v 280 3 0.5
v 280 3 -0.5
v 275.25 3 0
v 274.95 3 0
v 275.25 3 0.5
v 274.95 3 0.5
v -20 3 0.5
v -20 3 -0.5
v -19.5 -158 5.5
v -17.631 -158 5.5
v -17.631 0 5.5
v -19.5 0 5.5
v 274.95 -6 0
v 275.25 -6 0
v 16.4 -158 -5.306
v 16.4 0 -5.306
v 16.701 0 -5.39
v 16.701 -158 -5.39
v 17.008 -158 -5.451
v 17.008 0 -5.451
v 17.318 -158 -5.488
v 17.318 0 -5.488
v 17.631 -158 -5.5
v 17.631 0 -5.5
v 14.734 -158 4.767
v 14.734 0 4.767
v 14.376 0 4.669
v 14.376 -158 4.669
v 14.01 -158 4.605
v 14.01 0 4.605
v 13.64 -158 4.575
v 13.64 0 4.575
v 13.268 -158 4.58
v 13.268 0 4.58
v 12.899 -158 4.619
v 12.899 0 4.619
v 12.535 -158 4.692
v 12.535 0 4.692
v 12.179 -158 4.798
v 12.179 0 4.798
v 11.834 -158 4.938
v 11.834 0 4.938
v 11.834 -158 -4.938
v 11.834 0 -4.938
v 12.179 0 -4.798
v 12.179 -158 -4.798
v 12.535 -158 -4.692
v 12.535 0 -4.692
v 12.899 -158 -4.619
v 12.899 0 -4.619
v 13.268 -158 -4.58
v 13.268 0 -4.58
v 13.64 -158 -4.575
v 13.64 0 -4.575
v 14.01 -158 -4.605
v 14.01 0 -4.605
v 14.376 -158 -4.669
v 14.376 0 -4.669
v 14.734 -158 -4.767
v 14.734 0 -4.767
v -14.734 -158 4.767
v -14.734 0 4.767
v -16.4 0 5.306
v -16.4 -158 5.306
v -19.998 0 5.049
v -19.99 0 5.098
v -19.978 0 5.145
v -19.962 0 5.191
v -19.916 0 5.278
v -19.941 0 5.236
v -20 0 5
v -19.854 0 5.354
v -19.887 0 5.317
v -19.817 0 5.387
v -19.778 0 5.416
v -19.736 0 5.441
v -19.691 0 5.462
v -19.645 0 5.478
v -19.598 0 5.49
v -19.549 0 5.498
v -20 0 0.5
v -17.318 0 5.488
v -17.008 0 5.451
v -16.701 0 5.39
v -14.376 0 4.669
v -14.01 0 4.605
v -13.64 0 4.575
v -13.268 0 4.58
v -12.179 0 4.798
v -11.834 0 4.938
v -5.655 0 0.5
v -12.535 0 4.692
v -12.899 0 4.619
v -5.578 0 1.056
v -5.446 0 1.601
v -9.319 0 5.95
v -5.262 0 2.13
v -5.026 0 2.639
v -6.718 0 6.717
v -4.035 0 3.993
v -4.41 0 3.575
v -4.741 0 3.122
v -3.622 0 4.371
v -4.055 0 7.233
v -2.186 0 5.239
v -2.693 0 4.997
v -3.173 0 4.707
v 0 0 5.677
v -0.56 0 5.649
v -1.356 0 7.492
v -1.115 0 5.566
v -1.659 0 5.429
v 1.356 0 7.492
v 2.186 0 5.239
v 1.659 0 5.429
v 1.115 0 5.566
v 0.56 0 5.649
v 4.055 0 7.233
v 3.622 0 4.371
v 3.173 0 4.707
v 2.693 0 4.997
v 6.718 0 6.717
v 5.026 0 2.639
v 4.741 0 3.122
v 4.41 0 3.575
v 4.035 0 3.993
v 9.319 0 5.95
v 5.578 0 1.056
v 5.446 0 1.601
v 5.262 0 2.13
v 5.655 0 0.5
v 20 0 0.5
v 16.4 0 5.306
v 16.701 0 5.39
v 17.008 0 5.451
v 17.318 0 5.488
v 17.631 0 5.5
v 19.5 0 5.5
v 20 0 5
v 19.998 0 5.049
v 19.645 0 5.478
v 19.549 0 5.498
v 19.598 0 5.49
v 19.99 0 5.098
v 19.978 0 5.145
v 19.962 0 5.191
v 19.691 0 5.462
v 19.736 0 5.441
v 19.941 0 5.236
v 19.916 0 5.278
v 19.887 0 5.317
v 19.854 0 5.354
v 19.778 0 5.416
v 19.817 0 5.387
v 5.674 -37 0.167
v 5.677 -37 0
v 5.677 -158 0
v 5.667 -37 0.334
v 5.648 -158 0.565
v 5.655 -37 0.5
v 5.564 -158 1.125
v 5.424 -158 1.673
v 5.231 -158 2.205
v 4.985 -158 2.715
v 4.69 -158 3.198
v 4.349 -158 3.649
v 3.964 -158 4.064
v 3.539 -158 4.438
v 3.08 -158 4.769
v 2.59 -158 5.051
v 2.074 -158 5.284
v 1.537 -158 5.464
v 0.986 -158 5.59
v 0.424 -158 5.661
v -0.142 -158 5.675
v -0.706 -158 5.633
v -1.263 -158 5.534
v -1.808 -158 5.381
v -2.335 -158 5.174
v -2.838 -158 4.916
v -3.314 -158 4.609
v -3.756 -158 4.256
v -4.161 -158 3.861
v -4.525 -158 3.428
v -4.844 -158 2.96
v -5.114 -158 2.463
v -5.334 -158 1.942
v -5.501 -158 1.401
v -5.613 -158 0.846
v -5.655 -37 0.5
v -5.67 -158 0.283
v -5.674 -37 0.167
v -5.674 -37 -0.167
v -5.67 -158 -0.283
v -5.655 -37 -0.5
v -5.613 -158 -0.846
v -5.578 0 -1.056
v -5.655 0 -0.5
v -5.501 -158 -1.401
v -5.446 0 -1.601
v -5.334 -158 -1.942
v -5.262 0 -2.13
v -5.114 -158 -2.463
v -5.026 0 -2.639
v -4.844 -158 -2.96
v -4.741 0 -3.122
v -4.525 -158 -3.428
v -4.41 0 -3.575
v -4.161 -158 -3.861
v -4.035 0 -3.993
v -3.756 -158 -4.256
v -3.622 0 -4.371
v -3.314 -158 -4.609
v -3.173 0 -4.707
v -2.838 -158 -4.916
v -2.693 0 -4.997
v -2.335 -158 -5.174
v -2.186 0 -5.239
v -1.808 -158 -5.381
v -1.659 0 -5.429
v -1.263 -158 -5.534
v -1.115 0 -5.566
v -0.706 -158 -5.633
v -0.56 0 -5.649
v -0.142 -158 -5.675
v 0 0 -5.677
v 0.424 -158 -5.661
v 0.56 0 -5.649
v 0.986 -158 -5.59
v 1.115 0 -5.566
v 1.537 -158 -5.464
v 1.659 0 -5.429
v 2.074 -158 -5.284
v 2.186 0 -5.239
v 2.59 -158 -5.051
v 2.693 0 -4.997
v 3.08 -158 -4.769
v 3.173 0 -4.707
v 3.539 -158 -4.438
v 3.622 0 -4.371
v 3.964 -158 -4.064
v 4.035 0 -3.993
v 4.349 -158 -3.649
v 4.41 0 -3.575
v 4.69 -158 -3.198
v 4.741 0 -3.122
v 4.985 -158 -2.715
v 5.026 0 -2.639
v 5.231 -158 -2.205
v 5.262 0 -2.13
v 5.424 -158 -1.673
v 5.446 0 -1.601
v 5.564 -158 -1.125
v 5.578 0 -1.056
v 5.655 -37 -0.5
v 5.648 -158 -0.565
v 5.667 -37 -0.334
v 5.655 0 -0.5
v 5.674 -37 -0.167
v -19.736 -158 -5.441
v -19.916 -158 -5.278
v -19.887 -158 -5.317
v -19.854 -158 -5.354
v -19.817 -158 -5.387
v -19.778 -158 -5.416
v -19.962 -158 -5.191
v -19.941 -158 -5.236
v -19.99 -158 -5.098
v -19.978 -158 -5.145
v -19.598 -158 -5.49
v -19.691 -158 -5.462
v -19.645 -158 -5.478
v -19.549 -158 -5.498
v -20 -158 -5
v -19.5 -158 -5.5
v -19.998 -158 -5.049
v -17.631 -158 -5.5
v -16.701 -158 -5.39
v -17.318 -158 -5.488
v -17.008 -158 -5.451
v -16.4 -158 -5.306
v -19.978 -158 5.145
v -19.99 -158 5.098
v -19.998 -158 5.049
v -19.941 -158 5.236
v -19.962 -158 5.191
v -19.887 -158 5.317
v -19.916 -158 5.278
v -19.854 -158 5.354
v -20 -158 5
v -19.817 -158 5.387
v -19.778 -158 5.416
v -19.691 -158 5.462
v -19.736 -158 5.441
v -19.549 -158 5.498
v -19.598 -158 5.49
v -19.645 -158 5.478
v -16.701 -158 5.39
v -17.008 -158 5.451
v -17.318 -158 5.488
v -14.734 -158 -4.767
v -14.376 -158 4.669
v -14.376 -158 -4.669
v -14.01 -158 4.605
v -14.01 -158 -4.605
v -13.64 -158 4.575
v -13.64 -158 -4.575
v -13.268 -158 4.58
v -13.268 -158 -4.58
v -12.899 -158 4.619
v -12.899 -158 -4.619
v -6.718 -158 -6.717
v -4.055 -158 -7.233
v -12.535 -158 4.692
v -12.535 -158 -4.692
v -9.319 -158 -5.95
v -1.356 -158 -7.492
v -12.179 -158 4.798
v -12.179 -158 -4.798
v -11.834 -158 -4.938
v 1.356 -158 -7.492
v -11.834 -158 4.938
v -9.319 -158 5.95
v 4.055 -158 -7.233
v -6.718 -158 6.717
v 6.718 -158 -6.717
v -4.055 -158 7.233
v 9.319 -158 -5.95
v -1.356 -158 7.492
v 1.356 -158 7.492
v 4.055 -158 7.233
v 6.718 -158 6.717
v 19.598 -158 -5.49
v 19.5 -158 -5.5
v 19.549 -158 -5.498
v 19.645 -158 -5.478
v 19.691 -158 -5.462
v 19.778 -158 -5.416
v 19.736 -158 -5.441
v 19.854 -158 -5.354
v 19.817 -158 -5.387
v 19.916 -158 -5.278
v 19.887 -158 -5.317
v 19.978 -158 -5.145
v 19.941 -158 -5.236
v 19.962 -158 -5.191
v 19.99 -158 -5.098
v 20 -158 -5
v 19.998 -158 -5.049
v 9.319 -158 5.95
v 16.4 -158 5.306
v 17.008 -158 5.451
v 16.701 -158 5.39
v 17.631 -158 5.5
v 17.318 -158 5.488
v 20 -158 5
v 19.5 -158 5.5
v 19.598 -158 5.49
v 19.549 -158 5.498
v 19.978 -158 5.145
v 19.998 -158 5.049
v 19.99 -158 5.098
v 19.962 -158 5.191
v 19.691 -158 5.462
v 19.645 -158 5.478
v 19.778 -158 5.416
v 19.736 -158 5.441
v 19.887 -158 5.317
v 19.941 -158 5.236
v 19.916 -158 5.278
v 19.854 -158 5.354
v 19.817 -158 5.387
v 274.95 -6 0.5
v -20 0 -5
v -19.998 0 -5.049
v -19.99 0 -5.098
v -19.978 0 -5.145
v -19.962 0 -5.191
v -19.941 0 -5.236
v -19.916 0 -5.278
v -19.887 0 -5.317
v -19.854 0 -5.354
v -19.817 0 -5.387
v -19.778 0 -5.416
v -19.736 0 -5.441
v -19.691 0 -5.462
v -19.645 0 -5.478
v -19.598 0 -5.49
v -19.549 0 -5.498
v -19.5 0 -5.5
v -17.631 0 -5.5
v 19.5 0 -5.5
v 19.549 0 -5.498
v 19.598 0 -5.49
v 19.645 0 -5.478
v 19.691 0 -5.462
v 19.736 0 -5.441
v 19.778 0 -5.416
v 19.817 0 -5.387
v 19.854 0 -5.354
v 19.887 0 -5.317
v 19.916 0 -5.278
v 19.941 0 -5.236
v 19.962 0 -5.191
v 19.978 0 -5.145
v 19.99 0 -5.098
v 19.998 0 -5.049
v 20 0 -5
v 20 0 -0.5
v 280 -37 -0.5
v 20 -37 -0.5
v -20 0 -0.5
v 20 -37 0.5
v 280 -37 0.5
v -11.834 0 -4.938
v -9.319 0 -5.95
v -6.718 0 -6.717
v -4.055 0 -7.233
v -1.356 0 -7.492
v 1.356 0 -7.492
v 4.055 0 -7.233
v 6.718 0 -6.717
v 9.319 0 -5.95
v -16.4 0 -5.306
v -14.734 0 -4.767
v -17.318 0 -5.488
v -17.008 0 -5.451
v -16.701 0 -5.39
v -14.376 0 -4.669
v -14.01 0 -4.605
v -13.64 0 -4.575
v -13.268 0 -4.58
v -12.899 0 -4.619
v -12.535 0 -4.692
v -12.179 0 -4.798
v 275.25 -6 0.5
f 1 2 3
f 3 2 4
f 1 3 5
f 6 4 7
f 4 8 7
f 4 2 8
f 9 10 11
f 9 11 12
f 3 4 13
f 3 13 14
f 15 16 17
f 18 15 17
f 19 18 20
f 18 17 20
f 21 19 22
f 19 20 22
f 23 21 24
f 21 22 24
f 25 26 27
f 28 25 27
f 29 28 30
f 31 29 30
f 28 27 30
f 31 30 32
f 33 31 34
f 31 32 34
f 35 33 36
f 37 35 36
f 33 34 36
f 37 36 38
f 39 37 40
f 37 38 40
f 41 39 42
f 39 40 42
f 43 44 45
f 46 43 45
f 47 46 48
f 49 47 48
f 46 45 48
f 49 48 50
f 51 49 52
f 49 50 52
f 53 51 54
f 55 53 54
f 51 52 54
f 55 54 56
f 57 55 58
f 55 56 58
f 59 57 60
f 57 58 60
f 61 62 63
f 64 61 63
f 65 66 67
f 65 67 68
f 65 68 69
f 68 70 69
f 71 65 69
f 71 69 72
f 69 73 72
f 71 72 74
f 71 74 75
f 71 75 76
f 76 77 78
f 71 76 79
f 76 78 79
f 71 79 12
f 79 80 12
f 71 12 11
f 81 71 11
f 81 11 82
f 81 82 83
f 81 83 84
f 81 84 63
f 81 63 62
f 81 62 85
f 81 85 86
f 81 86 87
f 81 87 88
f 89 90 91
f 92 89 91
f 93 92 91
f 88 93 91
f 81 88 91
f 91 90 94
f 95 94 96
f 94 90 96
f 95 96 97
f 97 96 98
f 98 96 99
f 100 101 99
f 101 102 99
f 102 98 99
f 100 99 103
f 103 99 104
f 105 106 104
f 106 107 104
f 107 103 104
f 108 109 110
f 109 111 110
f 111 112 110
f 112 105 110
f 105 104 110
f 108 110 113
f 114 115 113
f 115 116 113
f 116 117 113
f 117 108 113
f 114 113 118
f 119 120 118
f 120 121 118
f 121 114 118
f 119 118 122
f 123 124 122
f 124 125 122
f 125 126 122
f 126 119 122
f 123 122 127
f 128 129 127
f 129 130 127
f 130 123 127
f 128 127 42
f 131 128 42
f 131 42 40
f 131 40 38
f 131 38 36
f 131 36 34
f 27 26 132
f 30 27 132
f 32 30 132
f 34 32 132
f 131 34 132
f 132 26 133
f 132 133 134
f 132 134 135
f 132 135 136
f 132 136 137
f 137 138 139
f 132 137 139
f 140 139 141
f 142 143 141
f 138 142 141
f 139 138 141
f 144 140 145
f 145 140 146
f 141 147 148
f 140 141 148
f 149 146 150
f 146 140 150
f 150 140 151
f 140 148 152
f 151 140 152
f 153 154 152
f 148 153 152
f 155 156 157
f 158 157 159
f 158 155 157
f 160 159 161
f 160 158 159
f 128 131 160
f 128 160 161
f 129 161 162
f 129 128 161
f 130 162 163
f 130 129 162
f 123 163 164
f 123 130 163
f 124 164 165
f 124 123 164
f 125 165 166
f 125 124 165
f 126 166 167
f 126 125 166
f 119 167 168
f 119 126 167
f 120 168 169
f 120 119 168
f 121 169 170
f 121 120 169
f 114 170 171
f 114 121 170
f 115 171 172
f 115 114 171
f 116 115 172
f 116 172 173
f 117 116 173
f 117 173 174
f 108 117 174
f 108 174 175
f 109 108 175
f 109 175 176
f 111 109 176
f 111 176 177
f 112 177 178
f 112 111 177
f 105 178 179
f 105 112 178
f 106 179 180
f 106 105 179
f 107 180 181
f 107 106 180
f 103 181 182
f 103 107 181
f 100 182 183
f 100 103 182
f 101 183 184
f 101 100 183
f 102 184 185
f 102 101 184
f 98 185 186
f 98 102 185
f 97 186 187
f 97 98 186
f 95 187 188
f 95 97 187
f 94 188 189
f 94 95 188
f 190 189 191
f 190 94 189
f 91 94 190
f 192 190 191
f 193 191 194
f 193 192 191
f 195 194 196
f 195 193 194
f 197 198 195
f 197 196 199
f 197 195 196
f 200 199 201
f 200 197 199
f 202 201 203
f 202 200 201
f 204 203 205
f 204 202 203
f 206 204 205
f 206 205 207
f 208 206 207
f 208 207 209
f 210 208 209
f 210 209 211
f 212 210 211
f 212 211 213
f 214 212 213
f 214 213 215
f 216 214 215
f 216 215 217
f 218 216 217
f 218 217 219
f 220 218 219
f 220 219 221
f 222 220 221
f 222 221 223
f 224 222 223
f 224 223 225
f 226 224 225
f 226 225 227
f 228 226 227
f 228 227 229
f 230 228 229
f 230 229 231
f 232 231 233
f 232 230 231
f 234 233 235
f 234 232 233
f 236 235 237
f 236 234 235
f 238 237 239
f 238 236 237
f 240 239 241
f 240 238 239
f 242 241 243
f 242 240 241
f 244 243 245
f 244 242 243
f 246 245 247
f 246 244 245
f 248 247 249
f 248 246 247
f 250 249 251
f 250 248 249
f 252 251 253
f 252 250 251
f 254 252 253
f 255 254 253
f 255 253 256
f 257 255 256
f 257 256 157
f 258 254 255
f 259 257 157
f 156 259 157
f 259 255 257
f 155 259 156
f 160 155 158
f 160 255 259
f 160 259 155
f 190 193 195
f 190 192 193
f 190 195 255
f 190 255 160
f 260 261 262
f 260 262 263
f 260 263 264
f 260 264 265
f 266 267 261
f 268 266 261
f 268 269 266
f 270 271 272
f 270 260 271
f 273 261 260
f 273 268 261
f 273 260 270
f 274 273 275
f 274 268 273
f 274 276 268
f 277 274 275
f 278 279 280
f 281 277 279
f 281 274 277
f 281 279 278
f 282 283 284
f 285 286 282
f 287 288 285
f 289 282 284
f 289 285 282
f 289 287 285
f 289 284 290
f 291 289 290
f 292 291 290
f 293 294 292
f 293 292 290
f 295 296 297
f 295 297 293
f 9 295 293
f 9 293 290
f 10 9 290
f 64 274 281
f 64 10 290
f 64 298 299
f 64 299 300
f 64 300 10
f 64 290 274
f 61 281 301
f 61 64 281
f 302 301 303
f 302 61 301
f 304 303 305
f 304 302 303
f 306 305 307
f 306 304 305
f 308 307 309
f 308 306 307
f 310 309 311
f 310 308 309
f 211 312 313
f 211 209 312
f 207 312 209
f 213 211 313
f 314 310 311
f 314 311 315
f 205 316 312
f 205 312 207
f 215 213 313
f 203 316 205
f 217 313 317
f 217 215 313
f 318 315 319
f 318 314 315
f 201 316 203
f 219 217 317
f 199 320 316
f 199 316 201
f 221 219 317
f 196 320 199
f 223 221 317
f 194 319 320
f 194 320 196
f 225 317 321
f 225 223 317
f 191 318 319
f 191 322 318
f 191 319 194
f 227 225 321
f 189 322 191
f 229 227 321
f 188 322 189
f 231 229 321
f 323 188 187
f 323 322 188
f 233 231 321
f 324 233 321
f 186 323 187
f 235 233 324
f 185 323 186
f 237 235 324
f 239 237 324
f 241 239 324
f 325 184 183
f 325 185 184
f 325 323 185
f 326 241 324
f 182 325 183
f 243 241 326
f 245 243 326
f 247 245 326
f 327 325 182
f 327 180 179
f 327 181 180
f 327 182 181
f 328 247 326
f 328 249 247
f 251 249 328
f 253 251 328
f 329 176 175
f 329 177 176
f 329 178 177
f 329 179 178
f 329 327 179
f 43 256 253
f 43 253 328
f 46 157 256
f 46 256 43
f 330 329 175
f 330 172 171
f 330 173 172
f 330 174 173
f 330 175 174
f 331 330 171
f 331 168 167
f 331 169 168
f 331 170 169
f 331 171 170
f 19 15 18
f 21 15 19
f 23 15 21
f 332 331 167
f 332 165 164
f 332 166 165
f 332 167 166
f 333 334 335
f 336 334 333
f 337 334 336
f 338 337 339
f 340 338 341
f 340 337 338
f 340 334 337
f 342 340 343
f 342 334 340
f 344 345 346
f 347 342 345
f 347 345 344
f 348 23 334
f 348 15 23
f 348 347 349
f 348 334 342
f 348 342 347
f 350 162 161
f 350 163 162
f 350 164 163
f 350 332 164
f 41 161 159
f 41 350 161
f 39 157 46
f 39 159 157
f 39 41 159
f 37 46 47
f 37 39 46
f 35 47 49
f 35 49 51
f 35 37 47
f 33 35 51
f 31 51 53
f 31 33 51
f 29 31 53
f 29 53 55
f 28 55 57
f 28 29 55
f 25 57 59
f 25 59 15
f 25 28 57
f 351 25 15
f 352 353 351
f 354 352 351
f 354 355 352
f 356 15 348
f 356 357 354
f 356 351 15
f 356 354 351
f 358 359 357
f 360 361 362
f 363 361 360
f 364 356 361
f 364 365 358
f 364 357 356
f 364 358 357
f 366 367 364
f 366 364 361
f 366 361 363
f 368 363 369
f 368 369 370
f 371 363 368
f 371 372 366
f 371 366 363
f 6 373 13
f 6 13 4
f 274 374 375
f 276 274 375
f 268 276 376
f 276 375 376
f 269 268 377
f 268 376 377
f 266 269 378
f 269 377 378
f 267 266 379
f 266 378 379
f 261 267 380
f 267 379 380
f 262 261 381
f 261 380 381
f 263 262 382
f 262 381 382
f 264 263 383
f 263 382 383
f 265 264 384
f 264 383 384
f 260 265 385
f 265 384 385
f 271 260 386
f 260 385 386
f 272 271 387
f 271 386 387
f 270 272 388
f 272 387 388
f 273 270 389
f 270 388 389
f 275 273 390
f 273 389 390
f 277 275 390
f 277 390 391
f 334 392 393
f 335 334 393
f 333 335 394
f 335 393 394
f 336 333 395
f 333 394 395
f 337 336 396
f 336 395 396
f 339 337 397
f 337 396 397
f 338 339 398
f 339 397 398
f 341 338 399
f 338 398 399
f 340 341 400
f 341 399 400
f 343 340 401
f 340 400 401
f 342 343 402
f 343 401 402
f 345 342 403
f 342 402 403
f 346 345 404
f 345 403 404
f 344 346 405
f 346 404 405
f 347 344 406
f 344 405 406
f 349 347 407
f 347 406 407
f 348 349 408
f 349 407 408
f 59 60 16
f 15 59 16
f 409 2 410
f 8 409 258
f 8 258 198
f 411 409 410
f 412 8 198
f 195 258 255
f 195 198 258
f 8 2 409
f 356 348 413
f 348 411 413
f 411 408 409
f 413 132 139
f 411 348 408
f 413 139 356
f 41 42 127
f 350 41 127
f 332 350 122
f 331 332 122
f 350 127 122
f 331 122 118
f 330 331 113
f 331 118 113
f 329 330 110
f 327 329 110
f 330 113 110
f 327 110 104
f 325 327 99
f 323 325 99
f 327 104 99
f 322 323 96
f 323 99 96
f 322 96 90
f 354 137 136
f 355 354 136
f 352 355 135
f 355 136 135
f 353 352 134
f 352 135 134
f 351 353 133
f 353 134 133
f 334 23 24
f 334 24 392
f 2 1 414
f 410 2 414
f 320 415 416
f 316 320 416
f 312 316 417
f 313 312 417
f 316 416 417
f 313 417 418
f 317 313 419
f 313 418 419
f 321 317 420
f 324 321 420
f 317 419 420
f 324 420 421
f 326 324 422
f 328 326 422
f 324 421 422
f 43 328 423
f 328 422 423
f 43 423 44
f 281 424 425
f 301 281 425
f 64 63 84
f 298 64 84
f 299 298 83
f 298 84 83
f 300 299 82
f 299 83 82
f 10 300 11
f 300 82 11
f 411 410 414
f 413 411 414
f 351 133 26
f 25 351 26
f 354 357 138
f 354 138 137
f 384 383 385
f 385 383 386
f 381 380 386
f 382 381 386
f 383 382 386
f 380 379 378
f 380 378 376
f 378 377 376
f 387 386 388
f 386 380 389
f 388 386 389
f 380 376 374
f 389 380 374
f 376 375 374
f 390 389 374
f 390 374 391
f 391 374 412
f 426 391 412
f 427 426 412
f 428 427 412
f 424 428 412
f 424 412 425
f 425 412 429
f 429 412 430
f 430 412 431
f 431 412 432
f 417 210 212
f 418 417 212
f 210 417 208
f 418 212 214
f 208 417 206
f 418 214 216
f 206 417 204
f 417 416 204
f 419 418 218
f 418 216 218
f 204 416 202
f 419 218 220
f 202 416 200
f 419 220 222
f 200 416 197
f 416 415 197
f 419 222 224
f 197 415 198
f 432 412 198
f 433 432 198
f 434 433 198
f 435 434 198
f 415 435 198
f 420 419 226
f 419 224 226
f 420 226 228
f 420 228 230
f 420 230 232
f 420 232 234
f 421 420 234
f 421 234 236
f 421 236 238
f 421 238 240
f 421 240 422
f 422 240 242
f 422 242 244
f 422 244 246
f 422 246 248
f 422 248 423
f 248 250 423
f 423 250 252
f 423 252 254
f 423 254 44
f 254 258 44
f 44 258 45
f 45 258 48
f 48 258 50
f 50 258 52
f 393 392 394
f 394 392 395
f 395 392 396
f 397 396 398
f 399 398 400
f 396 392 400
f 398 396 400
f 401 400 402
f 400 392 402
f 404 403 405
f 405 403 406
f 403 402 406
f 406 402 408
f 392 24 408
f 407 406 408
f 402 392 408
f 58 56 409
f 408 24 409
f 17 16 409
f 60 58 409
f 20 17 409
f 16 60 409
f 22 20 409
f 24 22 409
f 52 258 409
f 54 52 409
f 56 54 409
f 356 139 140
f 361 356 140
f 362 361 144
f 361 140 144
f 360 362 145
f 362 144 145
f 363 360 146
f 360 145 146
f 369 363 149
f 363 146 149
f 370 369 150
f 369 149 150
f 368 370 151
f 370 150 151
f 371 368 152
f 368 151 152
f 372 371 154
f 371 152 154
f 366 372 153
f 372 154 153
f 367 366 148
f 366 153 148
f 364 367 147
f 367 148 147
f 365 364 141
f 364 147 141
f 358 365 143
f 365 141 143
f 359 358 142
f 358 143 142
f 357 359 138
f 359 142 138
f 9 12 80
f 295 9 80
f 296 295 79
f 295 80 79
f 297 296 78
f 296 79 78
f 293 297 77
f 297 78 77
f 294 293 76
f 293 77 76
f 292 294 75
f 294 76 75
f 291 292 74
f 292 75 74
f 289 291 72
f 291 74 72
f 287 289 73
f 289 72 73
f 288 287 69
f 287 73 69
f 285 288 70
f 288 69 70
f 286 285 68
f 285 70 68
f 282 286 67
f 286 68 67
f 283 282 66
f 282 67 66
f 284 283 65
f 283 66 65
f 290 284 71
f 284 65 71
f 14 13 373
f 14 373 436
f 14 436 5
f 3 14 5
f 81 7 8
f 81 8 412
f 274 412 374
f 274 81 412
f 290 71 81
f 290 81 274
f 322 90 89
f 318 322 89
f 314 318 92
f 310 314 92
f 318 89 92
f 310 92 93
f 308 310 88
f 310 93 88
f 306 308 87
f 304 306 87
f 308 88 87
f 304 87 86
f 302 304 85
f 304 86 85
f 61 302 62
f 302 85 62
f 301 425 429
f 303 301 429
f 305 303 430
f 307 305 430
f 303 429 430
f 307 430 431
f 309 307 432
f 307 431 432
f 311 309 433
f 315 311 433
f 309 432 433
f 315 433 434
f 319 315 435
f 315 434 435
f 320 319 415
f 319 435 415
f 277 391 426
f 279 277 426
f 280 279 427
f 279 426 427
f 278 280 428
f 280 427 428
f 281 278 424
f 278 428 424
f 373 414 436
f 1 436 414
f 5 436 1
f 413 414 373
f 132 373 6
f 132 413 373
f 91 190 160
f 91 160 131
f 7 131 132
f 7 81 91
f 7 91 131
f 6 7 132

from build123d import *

# Parameters (mm, degrees)
F0_R     = 5.676649
F1_DEPTH = 158
F2_W     = 3
F2_H     = 1
F2_W_2   = 37
F3_DEPTH = 300
F4_W     = 0.3
F4_H     = 9
F5_DEPTH = 0.5


with BuildPart() as f1:
    # F0 (on Front) → F1 (new body)
    with BuildSketch(Plane.XZ):
        with BuildLine():
            Line((17.630959, -5.5), (19.5, -5.5))
            ThreePointArc((19.5, -5.5), (19.853553, -5.353553), (20, -5))
            Line((20, -5), (20, 5))
            ThreePointArc((20, 5), (19.853553, 5.353553), (19.5, 5.5))
            Line((19.5, 5.5), (17.630959, 5.5))
            ThreePointArc((17.630959, 5.5), (17.007706, 5.451146), (16.399678, 5.305778))
            Line((16.399678, 5.305778), (14.734471, 4.767035))
            ThreePointArc((14.734471, 4.767035), (13.268353, 4.579712), (11.834298, 4.937596))
            ThreePointArc((11.834298, 4.937596), (0, 7.524315), (-11.834298, 4.937596))
            ThreePointArc((-11.834298, 4.937596), (-13.268353, 4.579712), (-14.734471, 4.767035))
            Line((-14.734471, 4.767035), (-16.399678, 5.305778))
            ThreePointArc((-16.399678, 5.305778), (-17.007706, 5.451146), (-17.630959, 5.5))
            Line((-17.630959, 5.5), (-19.5, 5.5))
            ThreePointArc((-19.5, 5.5), (-19.853553, 5.353553), (-20, 5))
            Line((-20, 5), (-20, -5))
            ThreePointArc((-20, -5), (-19.853553, -5.353553), (-19.5, -5.5))
            Line((-19.5, -5.5), (-17.630959, -5.5))
            ThreePointArc((-17.630959, -5.5), (-17.007706, -5.451146), (-16.399678, -5.305778))
            Line((-16.399678, -5.305778), (-14.734471, -4.767035))
            ThreePointArc((-14.734471, -4.767035), (-13.268353, -4.579712), (-11.834298, -4.937596))
            ThreePointArc((-11.834298, -4.937596), (0, -7.524315), (11.834298, -4.937596))
            ThreePointArc((11.834298, -4.937596), (13.268353, -4.579712), (14.734471, -4.767035))
            Line((14.734471, -4.767035), (16.399678, -5.305778))
            ThreePointArc((16.399678, -5.305778), (17.007706, -5.451146), (17.630959, -5.5))
        make_face()
        Circle(F0_R, mode=Mode.SUBTRACT)
    extrude(amount=F1_DEPTH)

    # F2 (on face) → F3 (join)
    with BuildSketch(Plane(origin=(-20, 0, 0), x_dir=(0, -1, 0), z_dir=(-1, 0, 0))):
        with Locations((-1.5, 0)):
            Rectangle(F2_W, F2_H)
        with Locations((18.5, 0)):
            Rectangle(F2_W_2, F2_H)
    extrude(amount=-F3_DEPTH)

    # F4 (on face) → F5 (cut)
    with BuildSketch(Plane.XY.offset(0.5)):
        with Locations((275.1, -1.5)):
            Rectangle(F4_W, F4_H)
    extrude(amount=-F5_DEPTH, mode=Mode.SUBTRACT)


solid = f1.part
